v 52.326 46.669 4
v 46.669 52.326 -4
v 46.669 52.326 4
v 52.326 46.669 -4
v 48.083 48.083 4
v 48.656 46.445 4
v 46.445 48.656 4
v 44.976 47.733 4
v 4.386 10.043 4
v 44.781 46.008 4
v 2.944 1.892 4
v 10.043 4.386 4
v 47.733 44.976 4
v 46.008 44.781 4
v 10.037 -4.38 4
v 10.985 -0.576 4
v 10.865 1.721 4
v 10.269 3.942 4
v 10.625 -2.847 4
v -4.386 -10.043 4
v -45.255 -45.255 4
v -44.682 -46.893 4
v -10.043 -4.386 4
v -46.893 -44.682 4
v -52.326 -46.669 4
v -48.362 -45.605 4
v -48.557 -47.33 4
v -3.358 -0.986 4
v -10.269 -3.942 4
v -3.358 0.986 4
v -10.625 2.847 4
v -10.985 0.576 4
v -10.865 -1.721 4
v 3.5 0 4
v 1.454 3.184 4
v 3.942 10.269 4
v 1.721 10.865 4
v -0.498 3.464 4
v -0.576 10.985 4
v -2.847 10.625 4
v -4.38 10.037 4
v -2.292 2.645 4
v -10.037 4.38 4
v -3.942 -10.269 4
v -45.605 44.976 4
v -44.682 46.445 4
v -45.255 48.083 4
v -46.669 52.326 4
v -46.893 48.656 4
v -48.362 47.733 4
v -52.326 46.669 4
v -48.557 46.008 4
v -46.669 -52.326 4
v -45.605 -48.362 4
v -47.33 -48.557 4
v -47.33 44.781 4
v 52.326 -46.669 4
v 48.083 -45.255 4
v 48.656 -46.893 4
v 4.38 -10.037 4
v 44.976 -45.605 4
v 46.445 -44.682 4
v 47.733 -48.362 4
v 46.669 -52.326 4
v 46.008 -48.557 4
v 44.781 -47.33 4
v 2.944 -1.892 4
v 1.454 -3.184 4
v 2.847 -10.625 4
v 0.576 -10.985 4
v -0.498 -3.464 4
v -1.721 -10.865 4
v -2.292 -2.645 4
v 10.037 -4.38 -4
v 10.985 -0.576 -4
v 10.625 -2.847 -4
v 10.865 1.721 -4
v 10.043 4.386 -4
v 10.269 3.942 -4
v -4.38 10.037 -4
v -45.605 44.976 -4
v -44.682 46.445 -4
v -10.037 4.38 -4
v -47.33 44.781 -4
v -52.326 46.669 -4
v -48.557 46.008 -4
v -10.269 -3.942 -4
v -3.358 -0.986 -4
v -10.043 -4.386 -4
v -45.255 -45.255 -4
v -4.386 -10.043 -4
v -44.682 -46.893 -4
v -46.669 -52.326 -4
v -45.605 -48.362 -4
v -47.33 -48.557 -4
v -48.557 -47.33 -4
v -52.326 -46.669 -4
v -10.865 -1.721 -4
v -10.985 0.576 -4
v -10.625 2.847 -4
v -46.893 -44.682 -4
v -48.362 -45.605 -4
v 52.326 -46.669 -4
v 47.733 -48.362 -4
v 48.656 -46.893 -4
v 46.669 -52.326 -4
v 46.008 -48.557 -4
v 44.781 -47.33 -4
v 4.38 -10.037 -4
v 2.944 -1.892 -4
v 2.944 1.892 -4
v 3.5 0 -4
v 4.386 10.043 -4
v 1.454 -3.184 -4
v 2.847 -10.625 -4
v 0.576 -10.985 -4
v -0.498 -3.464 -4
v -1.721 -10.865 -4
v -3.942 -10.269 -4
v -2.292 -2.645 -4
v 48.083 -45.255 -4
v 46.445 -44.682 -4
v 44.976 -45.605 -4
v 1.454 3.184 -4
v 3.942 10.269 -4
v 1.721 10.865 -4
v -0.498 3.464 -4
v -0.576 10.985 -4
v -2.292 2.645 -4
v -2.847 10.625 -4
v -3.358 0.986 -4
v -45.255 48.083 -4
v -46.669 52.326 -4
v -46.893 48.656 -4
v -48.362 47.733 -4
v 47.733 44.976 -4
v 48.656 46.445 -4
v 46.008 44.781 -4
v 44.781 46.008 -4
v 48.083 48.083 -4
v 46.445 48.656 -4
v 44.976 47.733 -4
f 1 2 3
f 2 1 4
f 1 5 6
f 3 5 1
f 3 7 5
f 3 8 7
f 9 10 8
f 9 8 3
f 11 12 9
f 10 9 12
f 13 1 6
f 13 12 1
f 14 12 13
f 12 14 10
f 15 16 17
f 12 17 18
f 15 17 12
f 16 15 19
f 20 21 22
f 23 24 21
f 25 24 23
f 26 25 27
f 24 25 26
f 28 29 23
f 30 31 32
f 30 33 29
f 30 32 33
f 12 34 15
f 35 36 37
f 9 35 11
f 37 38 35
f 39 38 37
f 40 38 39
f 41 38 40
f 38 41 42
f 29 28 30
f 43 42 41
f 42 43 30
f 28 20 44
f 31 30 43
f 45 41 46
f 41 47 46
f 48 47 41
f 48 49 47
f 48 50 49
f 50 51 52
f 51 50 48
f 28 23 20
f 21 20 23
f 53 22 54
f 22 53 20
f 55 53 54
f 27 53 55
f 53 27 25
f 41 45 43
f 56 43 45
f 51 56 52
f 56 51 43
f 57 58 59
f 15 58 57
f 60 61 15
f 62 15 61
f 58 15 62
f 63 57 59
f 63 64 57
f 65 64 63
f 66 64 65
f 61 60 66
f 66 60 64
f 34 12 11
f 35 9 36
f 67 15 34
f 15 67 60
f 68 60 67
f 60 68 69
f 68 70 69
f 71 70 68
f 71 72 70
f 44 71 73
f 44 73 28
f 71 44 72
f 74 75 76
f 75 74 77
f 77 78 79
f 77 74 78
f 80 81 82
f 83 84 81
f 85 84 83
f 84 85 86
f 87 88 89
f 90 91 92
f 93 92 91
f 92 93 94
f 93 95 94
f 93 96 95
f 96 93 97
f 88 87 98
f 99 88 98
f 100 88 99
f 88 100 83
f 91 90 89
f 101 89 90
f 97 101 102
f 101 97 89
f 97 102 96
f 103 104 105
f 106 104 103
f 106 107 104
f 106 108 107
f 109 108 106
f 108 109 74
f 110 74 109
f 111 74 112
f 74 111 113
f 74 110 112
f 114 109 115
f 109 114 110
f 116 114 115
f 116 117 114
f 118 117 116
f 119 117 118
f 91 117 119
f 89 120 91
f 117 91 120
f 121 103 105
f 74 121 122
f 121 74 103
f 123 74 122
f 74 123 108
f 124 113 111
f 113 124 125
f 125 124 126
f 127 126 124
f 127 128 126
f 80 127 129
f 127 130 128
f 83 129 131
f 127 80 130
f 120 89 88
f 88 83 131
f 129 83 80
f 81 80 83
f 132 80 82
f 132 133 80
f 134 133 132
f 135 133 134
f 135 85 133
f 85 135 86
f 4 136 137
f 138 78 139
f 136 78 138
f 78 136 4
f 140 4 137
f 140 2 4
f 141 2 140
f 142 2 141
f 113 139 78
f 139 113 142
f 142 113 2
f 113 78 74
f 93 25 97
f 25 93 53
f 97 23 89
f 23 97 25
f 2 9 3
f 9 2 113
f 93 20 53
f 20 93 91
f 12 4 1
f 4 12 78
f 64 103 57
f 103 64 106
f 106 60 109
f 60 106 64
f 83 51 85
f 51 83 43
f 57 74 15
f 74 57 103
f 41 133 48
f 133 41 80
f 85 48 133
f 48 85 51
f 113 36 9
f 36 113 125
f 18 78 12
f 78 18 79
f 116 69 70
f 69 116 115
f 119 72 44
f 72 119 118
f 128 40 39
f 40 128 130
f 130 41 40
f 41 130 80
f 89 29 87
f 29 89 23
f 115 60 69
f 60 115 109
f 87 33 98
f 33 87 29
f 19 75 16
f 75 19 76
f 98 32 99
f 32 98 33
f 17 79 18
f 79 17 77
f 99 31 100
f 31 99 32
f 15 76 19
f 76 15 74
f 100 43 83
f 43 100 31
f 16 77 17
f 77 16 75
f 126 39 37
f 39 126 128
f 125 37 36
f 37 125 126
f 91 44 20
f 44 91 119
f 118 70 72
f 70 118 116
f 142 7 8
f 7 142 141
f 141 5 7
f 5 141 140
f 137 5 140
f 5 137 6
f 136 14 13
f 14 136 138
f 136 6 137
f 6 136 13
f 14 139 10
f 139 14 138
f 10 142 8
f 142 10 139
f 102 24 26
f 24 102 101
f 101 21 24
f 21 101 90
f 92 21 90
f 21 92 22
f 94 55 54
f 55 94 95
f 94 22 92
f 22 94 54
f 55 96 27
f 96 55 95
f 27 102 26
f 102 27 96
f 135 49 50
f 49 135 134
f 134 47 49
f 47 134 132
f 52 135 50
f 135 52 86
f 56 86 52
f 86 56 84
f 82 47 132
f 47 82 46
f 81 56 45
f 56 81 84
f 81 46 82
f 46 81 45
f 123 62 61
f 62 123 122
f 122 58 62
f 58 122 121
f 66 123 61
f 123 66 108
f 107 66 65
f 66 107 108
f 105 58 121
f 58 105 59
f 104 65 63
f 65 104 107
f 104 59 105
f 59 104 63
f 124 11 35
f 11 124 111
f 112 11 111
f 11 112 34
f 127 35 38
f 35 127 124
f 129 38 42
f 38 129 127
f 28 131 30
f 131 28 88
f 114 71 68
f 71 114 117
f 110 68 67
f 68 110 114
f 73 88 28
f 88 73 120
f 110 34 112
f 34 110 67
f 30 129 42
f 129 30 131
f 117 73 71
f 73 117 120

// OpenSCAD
diameter=140;
thickness=8;
bolt=6;
picavet_all();

module picavet()
{
    color([0,1,0]);
    color([0,1,0]) cube([diameter,thickness,thickness],center=true);
    rotate([0,0,90]) color([0,1,0]) cube([diameter,thickness,thickness],center=true);
    color([0,0,1]) cylinder(d=thickness*2+bolt,h=thickness,center=true);
        
   translate([-0.42*diameter,-3,thickness/2]) text("PICAVET",size=6,center=true);
    translate([12,-2,thickness/2]) text("www.mechanicape.nl",size=4,center=true);
    
}

module haakje()
{
    color([1,0,0]) cylinder(d=thickness/2,h=thickness*2,center=true);
}

module haakjes_all()
{
    distance_haakje_center=diameter/2-thickness/2;
    translate([1* distance_haakje_center,0,0]) haakje();
    translate([-1* distance_haakje_center,0,0]) haakje();
    translate([0,1* distance_haakje_center,0]) haakje();
    translate([0,-1* distance_haakje_center,0]) haakje();
}


module picavet_all()
{
    difference()
    {
        rotate([0,0,45]) picavet();
        rotate([0,0,45]) haakjes_all();
        cylinder(d=bolt+1,h=thickness+2,center=true);
    }
}
